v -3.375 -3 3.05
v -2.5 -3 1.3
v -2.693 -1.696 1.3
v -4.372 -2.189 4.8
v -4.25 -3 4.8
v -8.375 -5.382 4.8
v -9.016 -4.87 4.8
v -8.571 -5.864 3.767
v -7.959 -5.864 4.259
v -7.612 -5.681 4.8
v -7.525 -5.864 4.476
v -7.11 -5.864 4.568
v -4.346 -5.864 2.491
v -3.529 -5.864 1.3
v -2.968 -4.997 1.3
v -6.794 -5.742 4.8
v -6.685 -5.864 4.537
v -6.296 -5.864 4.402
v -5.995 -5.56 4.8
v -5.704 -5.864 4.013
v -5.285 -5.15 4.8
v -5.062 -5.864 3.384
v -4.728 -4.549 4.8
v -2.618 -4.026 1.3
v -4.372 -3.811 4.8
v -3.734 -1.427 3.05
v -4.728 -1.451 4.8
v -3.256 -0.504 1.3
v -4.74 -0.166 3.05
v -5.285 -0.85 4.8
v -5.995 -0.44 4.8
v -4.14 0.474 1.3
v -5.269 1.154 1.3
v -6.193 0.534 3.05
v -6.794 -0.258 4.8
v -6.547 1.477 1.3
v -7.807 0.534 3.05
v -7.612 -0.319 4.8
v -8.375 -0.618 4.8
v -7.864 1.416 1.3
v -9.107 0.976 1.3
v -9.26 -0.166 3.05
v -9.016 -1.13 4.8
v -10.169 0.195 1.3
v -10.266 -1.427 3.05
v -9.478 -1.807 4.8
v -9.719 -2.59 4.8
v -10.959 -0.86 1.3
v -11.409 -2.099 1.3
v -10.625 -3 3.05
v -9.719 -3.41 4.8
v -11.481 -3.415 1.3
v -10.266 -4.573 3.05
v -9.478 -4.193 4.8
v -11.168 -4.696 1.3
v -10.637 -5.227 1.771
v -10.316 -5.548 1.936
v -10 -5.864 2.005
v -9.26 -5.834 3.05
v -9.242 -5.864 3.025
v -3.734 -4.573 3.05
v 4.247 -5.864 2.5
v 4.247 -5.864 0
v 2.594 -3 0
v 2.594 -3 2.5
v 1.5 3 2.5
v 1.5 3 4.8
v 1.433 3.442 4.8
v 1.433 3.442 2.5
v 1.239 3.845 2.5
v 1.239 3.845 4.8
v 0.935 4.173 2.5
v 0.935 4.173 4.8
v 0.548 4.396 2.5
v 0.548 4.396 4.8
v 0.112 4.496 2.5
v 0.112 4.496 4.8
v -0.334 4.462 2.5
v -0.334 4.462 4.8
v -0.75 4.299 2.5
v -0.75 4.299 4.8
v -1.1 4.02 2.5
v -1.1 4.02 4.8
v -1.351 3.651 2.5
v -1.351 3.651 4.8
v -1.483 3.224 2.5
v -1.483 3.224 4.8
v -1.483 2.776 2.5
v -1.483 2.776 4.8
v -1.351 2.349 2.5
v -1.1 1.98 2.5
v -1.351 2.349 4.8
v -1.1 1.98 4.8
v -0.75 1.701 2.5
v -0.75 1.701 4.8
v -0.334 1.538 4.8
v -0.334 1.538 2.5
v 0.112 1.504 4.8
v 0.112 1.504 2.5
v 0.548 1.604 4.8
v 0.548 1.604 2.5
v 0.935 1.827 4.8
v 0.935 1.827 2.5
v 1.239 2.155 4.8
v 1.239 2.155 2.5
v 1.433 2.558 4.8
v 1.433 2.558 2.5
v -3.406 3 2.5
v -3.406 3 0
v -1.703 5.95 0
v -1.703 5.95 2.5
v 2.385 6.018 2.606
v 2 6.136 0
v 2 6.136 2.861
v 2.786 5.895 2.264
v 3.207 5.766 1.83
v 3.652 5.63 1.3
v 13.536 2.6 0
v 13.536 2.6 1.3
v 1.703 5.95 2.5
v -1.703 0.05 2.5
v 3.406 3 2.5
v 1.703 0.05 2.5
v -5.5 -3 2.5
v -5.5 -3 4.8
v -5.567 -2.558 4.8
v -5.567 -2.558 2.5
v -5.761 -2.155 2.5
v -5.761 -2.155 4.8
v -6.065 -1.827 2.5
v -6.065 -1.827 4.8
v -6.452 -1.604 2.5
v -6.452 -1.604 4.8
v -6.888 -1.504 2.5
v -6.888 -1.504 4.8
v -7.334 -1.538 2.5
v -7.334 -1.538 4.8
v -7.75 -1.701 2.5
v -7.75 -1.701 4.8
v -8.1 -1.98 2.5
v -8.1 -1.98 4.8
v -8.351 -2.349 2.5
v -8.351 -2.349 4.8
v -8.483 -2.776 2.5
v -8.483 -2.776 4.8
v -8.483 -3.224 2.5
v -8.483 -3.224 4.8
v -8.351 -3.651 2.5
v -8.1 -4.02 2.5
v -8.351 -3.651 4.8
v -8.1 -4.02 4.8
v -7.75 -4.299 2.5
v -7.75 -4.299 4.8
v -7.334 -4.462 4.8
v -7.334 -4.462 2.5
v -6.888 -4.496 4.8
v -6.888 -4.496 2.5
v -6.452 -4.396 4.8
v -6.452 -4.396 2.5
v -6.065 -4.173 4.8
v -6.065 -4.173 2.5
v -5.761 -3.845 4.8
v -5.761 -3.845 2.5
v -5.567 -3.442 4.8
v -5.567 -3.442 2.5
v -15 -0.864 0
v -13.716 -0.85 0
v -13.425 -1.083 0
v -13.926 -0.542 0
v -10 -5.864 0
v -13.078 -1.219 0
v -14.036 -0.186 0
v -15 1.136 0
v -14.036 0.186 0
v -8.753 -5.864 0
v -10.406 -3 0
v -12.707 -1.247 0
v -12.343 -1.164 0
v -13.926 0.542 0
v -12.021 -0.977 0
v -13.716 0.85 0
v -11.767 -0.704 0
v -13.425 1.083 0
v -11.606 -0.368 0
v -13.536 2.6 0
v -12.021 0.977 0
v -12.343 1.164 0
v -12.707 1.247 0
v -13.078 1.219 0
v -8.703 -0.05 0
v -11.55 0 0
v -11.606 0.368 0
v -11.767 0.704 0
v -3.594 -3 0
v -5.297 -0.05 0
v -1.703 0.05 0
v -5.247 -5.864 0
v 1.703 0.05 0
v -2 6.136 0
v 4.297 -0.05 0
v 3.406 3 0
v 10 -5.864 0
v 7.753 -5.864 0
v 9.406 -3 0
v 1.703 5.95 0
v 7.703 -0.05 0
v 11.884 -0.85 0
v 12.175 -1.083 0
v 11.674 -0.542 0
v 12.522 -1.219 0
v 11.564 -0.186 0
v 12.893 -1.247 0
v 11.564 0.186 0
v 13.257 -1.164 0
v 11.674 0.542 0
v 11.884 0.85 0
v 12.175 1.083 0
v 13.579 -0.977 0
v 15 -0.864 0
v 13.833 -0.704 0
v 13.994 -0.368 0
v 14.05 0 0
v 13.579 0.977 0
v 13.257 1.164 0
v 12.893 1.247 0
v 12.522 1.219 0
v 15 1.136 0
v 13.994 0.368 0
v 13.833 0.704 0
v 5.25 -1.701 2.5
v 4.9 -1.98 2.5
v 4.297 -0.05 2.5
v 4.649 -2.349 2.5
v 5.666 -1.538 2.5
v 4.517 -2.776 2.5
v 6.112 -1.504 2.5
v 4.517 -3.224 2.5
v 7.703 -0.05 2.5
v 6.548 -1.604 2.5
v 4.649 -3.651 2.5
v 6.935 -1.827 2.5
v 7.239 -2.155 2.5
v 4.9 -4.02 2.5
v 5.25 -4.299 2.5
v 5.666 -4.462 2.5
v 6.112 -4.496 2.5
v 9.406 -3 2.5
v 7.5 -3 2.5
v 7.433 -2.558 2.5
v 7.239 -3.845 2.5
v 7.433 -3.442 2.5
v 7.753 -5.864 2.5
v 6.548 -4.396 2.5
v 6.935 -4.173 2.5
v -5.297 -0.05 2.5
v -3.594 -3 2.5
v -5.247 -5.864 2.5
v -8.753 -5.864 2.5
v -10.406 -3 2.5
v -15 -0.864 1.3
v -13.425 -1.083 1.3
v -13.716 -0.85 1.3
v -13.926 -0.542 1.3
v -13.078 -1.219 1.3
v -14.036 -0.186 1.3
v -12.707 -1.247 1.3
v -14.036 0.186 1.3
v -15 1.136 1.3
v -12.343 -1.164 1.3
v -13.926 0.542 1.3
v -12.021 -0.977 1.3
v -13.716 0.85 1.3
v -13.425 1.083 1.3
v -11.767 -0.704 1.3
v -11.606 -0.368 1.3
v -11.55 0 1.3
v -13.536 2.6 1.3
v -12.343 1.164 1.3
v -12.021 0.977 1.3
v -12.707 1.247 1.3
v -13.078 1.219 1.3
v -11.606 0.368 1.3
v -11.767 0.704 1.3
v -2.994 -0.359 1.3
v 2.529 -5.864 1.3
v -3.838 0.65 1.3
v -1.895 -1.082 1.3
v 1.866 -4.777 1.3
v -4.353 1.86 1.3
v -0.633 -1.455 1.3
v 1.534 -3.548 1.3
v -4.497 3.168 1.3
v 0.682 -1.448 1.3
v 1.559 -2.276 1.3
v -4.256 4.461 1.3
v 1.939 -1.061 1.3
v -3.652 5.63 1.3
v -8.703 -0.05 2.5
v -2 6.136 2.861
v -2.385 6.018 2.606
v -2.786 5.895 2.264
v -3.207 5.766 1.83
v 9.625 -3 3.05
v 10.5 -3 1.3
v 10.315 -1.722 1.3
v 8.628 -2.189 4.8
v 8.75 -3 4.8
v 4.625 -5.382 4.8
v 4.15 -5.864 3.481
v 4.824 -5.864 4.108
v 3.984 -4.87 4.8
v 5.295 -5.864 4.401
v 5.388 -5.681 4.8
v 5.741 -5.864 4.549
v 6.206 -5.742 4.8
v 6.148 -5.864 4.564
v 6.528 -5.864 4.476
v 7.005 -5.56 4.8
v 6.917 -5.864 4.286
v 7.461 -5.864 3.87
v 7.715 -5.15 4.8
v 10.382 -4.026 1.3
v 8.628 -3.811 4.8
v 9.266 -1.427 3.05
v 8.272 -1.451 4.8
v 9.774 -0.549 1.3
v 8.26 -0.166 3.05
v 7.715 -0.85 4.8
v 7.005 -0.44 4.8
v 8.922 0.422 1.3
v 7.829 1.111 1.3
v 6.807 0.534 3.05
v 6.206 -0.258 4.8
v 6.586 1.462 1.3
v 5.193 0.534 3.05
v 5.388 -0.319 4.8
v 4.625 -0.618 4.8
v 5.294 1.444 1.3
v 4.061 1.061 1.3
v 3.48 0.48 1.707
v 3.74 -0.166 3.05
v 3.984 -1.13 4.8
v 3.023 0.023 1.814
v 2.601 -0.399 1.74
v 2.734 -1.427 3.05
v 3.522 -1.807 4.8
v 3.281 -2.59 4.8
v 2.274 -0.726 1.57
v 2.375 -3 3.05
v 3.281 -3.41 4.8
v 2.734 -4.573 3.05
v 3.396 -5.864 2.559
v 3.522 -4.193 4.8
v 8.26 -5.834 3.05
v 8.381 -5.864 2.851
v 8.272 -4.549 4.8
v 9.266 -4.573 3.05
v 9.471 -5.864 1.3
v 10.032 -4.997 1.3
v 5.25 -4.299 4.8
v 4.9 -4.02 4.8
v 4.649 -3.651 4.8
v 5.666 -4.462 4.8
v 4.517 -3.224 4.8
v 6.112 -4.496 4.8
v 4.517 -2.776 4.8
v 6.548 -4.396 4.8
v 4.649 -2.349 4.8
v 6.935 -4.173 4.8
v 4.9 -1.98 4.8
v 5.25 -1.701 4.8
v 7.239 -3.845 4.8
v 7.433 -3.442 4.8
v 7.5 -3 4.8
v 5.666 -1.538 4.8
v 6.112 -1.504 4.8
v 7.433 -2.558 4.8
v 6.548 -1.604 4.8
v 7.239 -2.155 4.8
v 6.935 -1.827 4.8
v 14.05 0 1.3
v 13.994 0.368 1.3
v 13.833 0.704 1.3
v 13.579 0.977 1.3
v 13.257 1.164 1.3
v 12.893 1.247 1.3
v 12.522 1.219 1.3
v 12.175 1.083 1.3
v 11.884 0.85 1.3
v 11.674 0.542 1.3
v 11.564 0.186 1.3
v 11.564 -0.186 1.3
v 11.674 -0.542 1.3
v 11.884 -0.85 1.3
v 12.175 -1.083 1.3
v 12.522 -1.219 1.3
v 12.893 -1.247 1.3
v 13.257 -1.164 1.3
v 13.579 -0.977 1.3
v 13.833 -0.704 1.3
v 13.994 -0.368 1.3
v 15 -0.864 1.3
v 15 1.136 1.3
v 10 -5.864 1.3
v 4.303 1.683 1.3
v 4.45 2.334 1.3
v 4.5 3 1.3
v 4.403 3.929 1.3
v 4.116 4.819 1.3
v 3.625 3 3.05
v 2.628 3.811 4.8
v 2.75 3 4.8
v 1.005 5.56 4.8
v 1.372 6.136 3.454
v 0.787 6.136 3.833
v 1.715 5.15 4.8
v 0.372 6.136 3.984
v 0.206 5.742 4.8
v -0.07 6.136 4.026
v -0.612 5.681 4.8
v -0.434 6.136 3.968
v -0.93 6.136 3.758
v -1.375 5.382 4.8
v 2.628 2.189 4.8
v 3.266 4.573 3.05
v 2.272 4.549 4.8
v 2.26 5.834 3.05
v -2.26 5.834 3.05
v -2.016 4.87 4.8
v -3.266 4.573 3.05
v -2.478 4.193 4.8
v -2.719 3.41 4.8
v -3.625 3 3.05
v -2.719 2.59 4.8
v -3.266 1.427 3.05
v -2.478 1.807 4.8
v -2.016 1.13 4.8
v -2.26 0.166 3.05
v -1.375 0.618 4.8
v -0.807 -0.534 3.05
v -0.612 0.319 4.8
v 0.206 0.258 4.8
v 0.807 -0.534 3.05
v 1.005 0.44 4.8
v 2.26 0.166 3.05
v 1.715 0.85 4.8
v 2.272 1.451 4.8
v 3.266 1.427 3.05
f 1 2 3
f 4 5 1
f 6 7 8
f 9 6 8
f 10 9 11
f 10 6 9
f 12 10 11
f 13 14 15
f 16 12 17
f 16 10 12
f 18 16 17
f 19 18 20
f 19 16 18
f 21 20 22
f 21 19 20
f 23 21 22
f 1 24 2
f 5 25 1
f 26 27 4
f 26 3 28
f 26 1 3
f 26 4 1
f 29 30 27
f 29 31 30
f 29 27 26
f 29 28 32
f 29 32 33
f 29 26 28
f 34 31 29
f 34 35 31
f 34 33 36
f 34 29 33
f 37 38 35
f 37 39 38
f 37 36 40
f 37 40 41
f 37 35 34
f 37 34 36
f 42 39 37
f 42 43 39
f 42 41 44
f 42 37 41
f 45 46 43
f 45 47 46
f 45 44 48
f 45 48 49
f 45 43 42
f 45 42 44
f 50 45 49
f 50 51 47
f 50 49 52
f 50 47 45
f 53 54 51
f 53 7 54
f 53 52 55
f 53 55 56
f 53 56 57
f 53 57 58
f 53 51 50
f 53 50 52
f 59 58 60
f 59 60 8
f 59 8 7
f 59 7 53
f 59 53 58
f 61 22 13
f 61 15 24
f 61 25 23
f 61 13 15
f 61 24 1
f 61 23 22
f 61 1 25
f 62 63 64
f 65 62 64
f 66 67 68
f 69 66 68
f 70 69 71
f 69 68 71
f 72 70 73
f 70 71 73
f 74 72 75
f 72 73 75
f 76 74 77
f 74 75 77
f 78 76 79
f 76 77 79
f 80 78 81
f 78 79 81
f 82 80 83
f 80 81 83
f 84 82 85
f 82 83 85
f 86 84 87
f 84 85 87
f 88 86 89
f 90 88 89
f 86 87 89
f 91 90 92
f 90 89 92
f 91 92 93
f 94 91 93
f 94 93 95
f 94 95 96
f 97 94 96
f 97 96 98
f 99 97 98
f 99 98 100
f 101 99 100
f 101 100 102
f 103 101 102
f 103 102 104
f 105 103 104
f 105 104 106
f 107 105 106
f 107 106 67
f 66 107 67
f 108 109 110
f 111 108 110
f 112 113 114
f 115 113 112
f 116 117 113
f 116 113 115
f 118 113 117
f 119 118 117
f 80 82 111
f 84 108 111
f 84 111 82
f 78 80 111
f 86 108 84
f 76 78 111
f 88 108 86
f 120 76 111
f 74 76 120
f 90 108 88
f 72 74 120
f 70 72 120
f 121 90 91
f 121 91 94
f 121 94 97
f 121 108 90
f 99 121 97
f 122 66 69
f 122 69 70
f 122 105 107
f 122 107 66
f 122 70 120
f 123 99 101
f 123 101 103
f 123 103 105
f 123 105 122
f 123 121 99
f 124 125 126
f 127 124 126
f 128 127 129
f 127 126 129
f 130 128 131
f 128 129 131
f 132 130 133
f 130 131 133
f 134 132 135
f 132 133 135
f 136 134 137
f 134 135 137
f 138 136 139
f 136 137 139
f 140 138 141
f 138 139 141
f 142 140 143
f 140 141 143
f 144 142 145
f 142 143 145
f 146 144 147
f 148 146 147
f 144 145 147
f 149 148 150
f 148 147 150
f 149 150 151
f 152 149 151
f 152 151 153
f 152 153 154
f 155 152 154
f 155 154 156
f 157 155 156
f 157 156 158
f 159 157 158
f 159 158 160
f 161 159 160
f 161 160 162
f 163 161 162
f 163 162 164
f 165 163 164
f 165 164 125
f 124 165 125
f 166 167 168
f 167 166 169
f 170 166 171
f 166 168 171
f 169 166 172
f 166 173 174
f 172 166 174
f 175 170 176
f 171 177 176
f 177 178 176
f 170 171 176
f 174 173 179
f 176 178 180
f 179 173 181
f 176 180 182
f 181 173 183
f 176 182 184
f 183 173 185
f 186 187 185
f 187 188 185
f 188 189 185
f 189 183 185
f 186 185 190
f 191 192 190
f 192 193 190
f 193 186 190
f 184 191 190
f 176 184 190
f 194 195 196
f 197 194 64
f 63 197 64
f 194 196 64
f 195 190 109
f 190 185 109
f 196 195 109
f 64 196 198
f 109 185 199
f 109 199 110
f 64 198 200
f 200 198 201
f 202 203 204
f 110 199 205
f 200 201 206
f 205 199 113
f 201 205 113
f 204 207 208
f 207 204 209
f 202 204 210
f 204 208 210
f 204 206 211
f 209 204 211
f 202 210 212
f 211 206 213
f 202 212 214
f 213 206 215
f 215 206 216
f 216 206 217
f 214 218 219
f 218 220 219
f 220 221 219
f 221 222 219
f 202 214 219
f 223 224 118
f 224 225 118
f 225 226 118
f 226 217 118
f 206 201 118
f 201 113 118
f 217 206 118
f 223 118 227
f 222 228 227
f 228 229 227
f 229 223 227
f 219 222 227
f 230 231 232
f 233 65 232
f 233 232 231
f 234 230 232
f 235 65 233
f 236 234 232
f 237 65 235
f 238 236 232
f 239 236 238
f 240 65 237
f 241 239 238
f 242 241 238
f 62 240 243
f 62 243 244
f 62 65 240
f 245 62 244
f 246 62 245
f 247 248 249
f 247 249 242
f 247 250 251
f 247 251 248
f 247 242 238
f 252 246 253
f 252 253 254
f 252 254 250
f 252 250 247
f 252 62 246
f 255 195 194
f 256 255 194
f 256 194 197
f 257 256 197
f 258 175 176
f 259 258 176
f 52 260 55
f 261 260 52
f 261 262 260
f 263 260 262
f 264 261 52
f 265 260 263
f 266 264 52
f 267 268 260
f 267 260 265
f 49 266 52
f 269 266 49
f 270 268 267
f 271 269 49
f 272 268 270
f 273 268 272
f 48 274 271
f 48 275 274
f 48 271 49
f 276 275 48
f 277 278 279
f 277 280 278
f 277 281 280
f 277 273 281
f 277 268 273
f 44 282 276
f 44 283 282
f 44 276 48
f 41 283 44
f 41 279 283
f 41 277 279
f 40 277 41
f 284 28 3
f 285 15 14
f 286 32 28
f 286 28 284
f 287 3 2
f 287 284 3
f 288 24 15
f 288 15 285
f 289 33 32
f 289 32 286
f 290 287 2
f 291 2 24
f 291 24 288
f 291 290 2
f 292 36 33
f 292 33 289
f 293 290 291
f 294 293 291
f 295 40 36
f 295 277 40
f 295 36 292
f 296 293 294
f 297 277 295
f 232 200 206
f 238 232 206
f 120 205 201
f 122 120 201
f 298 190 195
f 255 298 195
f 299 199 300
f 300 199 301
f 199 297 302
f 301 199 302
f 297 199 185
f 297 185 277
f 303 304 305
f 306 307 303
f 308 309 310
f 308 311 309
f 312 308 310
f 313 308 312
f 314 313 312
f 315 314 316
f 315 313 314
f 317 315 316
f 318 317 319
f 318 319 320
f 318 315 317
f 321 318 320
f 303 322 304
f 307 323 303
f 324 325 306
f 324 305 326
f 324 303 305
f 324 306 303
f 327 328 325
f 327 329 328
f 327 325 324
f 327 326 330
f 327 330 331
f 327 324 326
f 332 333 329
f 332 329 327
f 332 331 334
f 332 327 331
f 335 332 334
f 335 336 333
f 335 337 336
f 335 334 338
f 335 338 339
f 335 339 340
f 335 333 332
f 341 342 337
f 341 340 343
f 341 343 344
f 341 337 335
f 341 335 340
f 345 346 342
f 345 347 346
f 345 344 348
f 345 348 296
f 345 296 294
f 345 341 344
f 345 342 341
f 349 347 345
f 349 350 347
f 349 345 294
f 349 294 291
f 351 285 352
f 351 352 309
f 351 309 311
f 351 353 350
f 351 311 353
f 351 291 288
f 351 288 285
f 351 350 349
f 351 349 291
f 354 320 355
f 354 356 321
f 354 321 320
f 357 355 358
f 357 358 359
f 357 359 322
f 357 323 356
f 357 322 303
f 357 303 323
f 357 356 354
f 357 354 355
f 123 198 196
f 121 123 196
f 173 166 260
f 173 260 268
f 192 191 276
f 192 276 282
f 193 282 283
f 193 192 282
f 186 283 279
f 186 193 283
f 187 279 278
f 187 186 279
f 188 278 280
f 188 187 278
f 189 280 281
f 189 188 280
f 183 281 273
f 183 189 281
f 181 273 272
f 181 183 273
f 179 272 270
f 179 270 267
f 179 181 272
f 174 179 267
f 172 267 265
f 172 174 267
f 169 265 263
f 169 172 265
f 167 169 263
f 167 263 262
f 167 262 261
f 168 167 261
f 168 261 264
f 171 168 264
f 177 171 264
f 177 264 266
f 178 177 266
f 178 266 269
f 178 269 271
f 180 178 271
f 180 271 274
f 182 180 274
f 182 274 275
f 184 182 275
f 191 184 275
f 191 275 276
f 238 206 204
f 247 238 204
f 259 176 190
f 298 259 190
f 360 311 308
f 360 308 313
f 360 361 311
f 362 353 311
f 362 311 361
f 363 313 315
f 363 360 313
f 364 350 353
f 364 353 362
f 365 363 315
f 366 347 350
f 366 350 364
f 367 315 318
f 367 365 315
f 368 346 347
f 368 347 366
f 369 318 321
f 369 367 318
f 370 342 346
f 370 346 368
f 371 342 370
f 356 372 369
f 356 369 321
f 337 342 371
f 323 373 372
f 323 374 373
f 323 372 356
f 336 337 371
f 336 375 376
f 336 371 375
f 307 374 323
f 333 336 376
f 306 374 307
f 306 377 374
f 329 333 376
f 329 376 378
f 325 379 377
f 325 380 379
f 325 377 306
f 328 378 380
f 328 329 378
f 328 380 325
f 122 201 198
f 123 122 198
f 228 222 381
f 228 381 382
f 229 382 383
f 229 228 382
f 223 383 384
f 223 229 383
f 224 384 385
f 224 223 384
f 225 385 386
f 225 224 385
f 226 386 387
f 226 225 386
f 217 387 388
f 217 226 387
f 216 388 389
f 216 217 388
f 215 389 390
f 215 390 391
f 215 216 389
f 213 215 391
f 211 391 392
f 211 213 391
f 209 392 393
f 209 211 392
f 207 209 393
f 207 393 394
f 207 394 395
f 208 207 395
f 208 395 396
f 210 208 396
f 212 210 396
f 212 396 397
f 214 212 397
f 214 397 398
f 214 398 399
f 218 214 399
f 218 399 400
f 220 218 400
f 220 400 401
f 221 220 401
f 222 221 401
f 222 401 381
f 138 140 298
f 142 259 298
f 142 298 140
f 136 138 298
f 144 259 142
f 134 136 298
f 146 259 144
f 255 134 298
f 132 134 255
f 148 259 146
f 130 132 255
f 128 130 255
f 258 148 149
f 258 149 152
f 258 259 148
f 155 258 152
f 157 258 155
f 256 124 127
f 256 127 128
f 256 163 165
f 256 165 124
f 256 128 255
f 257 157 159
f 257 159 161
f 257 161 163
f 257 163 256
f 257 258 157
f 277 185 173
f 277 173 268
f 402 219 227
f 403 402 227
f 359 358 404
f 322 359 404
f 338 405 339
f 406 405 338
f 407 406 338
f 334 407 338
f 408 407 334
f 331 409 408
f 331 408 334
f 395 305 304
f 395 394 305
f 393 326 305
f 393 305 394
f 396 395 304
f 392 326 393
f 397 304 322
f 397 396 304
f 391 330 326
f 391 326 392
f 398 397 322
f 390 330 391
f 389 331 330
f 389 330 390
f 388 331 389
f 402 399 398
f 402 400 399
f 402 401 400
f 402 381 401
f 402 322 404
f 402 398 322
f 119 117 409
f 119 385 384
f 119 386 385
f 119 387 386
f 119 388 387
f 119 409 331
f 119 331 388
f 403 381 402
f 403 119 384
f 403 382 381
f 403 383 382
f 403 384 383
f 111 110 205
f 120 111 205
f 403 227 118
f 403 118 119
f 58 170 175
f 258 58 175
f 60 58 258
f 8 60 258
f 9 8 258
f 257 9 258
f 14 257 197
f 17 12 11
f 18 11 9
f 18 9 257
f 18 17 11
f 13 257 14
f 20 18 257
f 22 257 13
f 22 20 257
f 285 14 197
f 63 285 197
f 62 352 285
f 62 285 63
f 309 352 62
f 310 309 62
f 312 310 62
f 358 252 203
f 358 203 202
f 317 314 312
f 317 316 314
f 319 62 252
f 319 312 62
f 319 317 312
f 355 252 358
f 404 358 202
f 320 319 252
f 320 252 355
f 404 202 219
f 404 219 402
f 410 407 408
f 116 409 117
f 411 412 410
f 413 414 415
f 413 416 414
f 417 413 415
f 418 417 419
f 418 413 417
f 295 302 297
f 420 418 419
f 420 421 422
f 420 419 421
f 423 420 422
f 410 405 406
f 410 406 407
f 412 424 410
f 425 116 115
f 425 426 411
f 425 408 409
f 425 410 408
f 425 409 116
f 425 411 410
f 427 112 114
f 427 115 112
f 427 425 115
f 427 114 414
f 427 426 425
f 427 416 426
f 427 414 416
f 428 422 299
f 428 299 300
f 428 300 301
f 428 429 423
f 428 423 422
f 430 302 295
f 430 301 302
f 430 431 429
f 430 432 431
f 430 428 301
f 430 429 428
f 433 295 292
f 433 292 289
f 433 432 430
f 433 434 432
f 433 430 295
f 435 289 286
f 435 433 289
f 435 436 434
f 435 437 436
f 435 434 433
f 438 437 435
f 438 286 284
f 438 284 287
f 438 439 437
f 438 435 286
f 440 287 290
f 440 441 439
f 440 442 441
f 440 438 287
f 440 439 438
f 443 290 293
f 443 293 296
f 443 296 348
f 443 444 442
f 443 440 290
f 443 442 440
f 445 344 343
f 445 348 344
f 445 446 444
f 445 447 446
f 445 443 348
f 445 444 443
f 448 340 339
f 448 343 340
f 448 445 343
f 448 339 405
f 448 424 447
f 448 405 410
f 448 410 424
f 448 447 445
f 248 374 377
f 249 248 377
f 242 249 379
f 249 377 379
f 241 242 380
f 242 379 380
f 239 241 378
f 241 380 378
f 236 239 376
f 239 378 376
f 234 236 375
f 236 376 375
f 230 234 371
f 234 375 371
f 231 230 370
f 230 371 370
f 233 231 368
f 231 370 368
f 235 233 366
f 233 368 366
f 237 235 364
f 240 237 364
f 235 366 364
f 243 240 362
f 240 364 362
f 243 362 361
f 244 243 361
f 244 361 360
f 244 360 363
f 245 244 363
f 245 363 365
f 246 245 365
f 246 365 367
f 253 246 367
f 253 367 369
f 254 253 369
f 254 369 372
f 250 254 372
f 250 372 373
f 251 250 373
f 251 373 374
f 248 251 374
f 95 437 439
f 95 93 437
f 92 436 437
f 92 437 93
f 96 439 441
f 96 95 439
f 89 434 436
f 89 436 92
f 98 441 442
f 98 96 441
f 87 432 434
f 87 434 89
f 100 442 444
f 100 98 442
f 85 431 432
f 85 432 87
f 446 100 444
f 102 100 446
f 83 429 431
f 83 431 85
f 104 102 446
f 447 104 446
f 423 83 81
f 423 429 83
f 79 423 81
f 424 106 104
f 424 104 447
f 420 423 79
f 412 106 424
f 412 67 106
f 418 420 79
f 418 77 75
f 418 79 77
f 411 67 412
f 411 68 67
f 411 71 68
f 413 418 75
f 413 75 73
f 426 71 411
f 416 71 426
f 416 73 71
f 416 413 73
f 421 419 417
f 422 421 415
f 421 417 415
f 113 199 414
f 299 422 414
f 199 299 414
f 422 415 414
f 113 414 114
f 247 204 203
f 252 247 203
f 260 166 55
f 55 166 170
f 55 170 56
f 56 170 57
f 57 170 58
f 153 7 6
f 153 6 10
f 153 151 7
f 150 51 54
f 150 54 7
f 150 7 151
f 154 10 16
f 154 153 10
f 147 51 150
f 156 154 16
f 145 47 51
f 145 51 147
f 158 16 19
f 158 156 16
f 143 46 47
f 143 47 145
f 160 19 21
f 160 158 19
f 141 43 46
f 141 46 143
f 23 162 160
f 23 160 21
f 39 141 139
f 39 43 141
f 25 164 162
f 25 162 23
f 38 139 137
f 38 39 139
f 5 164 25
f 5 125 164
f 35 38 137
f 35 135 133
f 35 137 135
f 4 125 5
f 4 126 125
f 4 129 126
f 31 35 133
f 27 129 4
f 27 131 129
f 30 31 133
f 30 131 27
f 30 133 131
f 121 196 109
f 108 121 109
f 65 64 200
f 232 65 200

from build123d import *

# Parameters (mm, degrees)
F0_W     = 30
F0_H     = 12
F0_R     = 1.25
F1_DEPTH = 4.8
F2_R     = 1.5
F4_DEPTH = 4.8
F2_W     = 30
F2_H     = 12
F2_R_2   = 2.5
F2_R_3   = 1.25
F5_DEPTH = 3.5
F7_DEPTH = 2.5
F8_SIZE  = 5
F9_SIZE2 = 5
F9_SIZE  = 8


# Not quite as in the source:
# - a fillet or chamfer that OpenCascade refuses, or shapes differently, is made with other operations: its cross-section is extruded or revolved along the edge and cut away or added


with BuildPart() as f1:
    # F0 (on Top) → F1 (new body)
    with BuildSketch(Plane.XY):
        with Locations((0, 0.1359842196)):
            Rectangle(F0_W, F0_H)
        with Locations((-12.8, 0)):
            Circle(F0_R, mode=Mode.SUBTRACT)
        with Locations((12.8, 0)):
            Circle(F0_R, mode=Mode.SUBTRACT)
    extrude(amount=F1_DEPTH)

    # F2 (on face) → F4 (cut, through all)
    with BuildSketch(Plane.XY.offset(4.8)):
        with Locations((-7, -3)):
            Circle(F2_R)
        with Locations((0, 3)):
            Circle(F2_R)
        with Locations((6, -3)):
            Circle(F2_R)
    extrude(amount=-F4_DEPTH, mode=Mode.SUBTRACT)

    # F2 (on face) → F5 (cut)
    with BuildSketch(Plane.XY.offset(4.8)):
        with Locations((0, 0.1359842196)):
            Rectangle(F2_W, F2_H)
        with Locations((-7, -3)):
            Circle(F2_R_2, mode=Mode.SUBTRACT)
        with Locations((-12.8, 0)):
            Circle(F2_R_3, mode=Mode.SUBTRACT)
        with Locations((6, -3)):
            Circle(F2_R_2, mode=Mode.SUBTRACT)
        with Locations((12.8, 0)):
            Circle(F2_R_3, mode=Mode.SUBTRACT)
        with Locations((0, 3)):
            Circle(F2_R_2, mode=Mode.SUBTRACT)
    extrude(amount=-F5_DEPTH, mode=Mode.SUBTRACT)

    # F6: chamfer of 4 x 2 on 3 edges, made by hand


with BuildPart() as f6_tool2:
    # F6_s3 → F6_t4 (revolve)
    with BuildSketch(Plane.XZ.offset(3)):
        Polygon((-2.5, 1.3), (-4.5, 5.3), (-4.5, 1.3), align=None)
    revolve(axis=Axis((-7, -3, 1.3), (0, 0, 1)))

    split(bisect_by=Plane.XZ.offset(5.8640157804), keep=Keep.BOTTOM)

    split(bisect_by=Plane.XY.offset(4.8), keep=Keep.BOTTOM)


with BuildPart() as f1_1:
    add(f1.part)

    # F6_t1: union F6_tool2
    add(f6_tool2.part)


with BuildPart() as f6_tool8:
    # F6_s9 → F6_t10 (revolve)
    with BuildSketch(Plane.XZ.offset(-3)):
        Polygon((4.5, 1.3), (2.5, 5.3), (2.5, 1.3), align=None)
    revolve(axis=Axis((0, 3, 1.3), (0, 0, 1)))

    split(bisect_by=Plane.XZ.offset(-6.1359842196), keep=Keep.TOP)

    split(bisect_by=Plane.XY.offset(4.8), keep=Keep.BOTTOM)


with BuildPart() as f1_2:
    add(f1_1.part)

    # F6_t7: union F6_tool8
    add(f6_tool8.part)


with BuildPart() as f6_tool14:
    # F6_s15 → F6_t16 (revolve)
    with BuildSketch(Plane.XZ.offset(3)):
        Polygon((10.5, 1.3), (8.5, 5.3), (8.5, 1.3), align=None)
    revolve(axis=Axis((6, -3, 1.3), (0, 0, 1)))

    split(bisect_by=Plane.XZ.offset(5.8640157804), keep=Keep.BOTTOM)

    split(bisect_by=Plane.XY.offset(4.8), keep=Keep.BOTTOM)


with BuildPart() as f1_3:
    add(f1_2.part)

    # F6_t13: union F6_tool14
    add(f6_tool14.part)

    # F3 (on face) → F7 (cut)
    with BuildSketch(Plane(origin=(0, 0, 0), x_dir=(1, 0, 0), z_dir=(0, 0, -1))):
        Polygon((-5.2968167059, 5.95), (-8.7031832941, 5.95), (-8.7528263064, 5.8640157804), (-5.2471736936, 5.8640157804), align=None)
        Polygon((7.7528263064, 5.8640157804), (4.2471736936, 5.8640157804), (2.5936334118, 3), (4.2968167059, 0.05), (7.7031832941, 0.05), (9.4063665882, 3), align=None)
        Polygon((-1.7031832941, -5.95), (1.7031832941, -5.95), (3.4063665882, -3), (1.7031832941, -0.05), (-1.7031832941, -0.05), (-3.4063665882, -3), align=None)
        Polygon((-5.2471736936, 5.8640157804), (-8.7528263064, 5.8640157804), (-10.4063665882, 3), (-8.7031832941, 0.05), (-5.2968167059, 0.05), (-3.5936334118, 3), align=None)
    extrude(amount=-F7_DEPTH, mode=Mode.SUBTRACT)

    # F8 (call 1 of 4: OpenCascade refuses the feature's edges together)
    f8_edges = [f1_3.edges().sort_by_distance(p)[0] for p in [
        (-15, 6.135984, 0.65),
    ]]
    chamfer(f8_edges, length=F8_SIZE)

    # F8#2 (call 2 of 4)
    f8_2_edges = [f1_3.edges().sort_by_distance(p)[0] for p in [
        (-15, -5.864016, 0.65),
    ]]
    chamfer(f8_2_edges, length=F8_SIZE)

    # F8#3 (call 3 of 4)
    f8_3_edges = [f1_3.edges().sort_by_distance(p)[0] for p in [
        (15, 6.135984, 0.65),
    ]]
    chamfer(f8_3_edges, length=F8_SIZE)

    # F8#4 (call 4 of 4)
    f8_4_edges = [f1_3.edges().sort_by_distance(p)[0] for p in [
        (15, -5.864016, 0.65),
    ]]
    chamfer(f8_4_edges, length=F8_SIZE)

    # F9
    f9_edges = [f1_3.edges().sort_by_distance(p)[0] for p in [
        (10, 6.135984, 0.65),
        (-10, 6.135984, 0.65),
    ]]
    f9_side = f1_3.faces().sort_by_distance((0, 6.135984, 1.172283))[0]
    chamfer(f9_edges, length=F9_SIZE, length2=F9_SIZE2, reference=f9_side)


solid = f1_3.part
